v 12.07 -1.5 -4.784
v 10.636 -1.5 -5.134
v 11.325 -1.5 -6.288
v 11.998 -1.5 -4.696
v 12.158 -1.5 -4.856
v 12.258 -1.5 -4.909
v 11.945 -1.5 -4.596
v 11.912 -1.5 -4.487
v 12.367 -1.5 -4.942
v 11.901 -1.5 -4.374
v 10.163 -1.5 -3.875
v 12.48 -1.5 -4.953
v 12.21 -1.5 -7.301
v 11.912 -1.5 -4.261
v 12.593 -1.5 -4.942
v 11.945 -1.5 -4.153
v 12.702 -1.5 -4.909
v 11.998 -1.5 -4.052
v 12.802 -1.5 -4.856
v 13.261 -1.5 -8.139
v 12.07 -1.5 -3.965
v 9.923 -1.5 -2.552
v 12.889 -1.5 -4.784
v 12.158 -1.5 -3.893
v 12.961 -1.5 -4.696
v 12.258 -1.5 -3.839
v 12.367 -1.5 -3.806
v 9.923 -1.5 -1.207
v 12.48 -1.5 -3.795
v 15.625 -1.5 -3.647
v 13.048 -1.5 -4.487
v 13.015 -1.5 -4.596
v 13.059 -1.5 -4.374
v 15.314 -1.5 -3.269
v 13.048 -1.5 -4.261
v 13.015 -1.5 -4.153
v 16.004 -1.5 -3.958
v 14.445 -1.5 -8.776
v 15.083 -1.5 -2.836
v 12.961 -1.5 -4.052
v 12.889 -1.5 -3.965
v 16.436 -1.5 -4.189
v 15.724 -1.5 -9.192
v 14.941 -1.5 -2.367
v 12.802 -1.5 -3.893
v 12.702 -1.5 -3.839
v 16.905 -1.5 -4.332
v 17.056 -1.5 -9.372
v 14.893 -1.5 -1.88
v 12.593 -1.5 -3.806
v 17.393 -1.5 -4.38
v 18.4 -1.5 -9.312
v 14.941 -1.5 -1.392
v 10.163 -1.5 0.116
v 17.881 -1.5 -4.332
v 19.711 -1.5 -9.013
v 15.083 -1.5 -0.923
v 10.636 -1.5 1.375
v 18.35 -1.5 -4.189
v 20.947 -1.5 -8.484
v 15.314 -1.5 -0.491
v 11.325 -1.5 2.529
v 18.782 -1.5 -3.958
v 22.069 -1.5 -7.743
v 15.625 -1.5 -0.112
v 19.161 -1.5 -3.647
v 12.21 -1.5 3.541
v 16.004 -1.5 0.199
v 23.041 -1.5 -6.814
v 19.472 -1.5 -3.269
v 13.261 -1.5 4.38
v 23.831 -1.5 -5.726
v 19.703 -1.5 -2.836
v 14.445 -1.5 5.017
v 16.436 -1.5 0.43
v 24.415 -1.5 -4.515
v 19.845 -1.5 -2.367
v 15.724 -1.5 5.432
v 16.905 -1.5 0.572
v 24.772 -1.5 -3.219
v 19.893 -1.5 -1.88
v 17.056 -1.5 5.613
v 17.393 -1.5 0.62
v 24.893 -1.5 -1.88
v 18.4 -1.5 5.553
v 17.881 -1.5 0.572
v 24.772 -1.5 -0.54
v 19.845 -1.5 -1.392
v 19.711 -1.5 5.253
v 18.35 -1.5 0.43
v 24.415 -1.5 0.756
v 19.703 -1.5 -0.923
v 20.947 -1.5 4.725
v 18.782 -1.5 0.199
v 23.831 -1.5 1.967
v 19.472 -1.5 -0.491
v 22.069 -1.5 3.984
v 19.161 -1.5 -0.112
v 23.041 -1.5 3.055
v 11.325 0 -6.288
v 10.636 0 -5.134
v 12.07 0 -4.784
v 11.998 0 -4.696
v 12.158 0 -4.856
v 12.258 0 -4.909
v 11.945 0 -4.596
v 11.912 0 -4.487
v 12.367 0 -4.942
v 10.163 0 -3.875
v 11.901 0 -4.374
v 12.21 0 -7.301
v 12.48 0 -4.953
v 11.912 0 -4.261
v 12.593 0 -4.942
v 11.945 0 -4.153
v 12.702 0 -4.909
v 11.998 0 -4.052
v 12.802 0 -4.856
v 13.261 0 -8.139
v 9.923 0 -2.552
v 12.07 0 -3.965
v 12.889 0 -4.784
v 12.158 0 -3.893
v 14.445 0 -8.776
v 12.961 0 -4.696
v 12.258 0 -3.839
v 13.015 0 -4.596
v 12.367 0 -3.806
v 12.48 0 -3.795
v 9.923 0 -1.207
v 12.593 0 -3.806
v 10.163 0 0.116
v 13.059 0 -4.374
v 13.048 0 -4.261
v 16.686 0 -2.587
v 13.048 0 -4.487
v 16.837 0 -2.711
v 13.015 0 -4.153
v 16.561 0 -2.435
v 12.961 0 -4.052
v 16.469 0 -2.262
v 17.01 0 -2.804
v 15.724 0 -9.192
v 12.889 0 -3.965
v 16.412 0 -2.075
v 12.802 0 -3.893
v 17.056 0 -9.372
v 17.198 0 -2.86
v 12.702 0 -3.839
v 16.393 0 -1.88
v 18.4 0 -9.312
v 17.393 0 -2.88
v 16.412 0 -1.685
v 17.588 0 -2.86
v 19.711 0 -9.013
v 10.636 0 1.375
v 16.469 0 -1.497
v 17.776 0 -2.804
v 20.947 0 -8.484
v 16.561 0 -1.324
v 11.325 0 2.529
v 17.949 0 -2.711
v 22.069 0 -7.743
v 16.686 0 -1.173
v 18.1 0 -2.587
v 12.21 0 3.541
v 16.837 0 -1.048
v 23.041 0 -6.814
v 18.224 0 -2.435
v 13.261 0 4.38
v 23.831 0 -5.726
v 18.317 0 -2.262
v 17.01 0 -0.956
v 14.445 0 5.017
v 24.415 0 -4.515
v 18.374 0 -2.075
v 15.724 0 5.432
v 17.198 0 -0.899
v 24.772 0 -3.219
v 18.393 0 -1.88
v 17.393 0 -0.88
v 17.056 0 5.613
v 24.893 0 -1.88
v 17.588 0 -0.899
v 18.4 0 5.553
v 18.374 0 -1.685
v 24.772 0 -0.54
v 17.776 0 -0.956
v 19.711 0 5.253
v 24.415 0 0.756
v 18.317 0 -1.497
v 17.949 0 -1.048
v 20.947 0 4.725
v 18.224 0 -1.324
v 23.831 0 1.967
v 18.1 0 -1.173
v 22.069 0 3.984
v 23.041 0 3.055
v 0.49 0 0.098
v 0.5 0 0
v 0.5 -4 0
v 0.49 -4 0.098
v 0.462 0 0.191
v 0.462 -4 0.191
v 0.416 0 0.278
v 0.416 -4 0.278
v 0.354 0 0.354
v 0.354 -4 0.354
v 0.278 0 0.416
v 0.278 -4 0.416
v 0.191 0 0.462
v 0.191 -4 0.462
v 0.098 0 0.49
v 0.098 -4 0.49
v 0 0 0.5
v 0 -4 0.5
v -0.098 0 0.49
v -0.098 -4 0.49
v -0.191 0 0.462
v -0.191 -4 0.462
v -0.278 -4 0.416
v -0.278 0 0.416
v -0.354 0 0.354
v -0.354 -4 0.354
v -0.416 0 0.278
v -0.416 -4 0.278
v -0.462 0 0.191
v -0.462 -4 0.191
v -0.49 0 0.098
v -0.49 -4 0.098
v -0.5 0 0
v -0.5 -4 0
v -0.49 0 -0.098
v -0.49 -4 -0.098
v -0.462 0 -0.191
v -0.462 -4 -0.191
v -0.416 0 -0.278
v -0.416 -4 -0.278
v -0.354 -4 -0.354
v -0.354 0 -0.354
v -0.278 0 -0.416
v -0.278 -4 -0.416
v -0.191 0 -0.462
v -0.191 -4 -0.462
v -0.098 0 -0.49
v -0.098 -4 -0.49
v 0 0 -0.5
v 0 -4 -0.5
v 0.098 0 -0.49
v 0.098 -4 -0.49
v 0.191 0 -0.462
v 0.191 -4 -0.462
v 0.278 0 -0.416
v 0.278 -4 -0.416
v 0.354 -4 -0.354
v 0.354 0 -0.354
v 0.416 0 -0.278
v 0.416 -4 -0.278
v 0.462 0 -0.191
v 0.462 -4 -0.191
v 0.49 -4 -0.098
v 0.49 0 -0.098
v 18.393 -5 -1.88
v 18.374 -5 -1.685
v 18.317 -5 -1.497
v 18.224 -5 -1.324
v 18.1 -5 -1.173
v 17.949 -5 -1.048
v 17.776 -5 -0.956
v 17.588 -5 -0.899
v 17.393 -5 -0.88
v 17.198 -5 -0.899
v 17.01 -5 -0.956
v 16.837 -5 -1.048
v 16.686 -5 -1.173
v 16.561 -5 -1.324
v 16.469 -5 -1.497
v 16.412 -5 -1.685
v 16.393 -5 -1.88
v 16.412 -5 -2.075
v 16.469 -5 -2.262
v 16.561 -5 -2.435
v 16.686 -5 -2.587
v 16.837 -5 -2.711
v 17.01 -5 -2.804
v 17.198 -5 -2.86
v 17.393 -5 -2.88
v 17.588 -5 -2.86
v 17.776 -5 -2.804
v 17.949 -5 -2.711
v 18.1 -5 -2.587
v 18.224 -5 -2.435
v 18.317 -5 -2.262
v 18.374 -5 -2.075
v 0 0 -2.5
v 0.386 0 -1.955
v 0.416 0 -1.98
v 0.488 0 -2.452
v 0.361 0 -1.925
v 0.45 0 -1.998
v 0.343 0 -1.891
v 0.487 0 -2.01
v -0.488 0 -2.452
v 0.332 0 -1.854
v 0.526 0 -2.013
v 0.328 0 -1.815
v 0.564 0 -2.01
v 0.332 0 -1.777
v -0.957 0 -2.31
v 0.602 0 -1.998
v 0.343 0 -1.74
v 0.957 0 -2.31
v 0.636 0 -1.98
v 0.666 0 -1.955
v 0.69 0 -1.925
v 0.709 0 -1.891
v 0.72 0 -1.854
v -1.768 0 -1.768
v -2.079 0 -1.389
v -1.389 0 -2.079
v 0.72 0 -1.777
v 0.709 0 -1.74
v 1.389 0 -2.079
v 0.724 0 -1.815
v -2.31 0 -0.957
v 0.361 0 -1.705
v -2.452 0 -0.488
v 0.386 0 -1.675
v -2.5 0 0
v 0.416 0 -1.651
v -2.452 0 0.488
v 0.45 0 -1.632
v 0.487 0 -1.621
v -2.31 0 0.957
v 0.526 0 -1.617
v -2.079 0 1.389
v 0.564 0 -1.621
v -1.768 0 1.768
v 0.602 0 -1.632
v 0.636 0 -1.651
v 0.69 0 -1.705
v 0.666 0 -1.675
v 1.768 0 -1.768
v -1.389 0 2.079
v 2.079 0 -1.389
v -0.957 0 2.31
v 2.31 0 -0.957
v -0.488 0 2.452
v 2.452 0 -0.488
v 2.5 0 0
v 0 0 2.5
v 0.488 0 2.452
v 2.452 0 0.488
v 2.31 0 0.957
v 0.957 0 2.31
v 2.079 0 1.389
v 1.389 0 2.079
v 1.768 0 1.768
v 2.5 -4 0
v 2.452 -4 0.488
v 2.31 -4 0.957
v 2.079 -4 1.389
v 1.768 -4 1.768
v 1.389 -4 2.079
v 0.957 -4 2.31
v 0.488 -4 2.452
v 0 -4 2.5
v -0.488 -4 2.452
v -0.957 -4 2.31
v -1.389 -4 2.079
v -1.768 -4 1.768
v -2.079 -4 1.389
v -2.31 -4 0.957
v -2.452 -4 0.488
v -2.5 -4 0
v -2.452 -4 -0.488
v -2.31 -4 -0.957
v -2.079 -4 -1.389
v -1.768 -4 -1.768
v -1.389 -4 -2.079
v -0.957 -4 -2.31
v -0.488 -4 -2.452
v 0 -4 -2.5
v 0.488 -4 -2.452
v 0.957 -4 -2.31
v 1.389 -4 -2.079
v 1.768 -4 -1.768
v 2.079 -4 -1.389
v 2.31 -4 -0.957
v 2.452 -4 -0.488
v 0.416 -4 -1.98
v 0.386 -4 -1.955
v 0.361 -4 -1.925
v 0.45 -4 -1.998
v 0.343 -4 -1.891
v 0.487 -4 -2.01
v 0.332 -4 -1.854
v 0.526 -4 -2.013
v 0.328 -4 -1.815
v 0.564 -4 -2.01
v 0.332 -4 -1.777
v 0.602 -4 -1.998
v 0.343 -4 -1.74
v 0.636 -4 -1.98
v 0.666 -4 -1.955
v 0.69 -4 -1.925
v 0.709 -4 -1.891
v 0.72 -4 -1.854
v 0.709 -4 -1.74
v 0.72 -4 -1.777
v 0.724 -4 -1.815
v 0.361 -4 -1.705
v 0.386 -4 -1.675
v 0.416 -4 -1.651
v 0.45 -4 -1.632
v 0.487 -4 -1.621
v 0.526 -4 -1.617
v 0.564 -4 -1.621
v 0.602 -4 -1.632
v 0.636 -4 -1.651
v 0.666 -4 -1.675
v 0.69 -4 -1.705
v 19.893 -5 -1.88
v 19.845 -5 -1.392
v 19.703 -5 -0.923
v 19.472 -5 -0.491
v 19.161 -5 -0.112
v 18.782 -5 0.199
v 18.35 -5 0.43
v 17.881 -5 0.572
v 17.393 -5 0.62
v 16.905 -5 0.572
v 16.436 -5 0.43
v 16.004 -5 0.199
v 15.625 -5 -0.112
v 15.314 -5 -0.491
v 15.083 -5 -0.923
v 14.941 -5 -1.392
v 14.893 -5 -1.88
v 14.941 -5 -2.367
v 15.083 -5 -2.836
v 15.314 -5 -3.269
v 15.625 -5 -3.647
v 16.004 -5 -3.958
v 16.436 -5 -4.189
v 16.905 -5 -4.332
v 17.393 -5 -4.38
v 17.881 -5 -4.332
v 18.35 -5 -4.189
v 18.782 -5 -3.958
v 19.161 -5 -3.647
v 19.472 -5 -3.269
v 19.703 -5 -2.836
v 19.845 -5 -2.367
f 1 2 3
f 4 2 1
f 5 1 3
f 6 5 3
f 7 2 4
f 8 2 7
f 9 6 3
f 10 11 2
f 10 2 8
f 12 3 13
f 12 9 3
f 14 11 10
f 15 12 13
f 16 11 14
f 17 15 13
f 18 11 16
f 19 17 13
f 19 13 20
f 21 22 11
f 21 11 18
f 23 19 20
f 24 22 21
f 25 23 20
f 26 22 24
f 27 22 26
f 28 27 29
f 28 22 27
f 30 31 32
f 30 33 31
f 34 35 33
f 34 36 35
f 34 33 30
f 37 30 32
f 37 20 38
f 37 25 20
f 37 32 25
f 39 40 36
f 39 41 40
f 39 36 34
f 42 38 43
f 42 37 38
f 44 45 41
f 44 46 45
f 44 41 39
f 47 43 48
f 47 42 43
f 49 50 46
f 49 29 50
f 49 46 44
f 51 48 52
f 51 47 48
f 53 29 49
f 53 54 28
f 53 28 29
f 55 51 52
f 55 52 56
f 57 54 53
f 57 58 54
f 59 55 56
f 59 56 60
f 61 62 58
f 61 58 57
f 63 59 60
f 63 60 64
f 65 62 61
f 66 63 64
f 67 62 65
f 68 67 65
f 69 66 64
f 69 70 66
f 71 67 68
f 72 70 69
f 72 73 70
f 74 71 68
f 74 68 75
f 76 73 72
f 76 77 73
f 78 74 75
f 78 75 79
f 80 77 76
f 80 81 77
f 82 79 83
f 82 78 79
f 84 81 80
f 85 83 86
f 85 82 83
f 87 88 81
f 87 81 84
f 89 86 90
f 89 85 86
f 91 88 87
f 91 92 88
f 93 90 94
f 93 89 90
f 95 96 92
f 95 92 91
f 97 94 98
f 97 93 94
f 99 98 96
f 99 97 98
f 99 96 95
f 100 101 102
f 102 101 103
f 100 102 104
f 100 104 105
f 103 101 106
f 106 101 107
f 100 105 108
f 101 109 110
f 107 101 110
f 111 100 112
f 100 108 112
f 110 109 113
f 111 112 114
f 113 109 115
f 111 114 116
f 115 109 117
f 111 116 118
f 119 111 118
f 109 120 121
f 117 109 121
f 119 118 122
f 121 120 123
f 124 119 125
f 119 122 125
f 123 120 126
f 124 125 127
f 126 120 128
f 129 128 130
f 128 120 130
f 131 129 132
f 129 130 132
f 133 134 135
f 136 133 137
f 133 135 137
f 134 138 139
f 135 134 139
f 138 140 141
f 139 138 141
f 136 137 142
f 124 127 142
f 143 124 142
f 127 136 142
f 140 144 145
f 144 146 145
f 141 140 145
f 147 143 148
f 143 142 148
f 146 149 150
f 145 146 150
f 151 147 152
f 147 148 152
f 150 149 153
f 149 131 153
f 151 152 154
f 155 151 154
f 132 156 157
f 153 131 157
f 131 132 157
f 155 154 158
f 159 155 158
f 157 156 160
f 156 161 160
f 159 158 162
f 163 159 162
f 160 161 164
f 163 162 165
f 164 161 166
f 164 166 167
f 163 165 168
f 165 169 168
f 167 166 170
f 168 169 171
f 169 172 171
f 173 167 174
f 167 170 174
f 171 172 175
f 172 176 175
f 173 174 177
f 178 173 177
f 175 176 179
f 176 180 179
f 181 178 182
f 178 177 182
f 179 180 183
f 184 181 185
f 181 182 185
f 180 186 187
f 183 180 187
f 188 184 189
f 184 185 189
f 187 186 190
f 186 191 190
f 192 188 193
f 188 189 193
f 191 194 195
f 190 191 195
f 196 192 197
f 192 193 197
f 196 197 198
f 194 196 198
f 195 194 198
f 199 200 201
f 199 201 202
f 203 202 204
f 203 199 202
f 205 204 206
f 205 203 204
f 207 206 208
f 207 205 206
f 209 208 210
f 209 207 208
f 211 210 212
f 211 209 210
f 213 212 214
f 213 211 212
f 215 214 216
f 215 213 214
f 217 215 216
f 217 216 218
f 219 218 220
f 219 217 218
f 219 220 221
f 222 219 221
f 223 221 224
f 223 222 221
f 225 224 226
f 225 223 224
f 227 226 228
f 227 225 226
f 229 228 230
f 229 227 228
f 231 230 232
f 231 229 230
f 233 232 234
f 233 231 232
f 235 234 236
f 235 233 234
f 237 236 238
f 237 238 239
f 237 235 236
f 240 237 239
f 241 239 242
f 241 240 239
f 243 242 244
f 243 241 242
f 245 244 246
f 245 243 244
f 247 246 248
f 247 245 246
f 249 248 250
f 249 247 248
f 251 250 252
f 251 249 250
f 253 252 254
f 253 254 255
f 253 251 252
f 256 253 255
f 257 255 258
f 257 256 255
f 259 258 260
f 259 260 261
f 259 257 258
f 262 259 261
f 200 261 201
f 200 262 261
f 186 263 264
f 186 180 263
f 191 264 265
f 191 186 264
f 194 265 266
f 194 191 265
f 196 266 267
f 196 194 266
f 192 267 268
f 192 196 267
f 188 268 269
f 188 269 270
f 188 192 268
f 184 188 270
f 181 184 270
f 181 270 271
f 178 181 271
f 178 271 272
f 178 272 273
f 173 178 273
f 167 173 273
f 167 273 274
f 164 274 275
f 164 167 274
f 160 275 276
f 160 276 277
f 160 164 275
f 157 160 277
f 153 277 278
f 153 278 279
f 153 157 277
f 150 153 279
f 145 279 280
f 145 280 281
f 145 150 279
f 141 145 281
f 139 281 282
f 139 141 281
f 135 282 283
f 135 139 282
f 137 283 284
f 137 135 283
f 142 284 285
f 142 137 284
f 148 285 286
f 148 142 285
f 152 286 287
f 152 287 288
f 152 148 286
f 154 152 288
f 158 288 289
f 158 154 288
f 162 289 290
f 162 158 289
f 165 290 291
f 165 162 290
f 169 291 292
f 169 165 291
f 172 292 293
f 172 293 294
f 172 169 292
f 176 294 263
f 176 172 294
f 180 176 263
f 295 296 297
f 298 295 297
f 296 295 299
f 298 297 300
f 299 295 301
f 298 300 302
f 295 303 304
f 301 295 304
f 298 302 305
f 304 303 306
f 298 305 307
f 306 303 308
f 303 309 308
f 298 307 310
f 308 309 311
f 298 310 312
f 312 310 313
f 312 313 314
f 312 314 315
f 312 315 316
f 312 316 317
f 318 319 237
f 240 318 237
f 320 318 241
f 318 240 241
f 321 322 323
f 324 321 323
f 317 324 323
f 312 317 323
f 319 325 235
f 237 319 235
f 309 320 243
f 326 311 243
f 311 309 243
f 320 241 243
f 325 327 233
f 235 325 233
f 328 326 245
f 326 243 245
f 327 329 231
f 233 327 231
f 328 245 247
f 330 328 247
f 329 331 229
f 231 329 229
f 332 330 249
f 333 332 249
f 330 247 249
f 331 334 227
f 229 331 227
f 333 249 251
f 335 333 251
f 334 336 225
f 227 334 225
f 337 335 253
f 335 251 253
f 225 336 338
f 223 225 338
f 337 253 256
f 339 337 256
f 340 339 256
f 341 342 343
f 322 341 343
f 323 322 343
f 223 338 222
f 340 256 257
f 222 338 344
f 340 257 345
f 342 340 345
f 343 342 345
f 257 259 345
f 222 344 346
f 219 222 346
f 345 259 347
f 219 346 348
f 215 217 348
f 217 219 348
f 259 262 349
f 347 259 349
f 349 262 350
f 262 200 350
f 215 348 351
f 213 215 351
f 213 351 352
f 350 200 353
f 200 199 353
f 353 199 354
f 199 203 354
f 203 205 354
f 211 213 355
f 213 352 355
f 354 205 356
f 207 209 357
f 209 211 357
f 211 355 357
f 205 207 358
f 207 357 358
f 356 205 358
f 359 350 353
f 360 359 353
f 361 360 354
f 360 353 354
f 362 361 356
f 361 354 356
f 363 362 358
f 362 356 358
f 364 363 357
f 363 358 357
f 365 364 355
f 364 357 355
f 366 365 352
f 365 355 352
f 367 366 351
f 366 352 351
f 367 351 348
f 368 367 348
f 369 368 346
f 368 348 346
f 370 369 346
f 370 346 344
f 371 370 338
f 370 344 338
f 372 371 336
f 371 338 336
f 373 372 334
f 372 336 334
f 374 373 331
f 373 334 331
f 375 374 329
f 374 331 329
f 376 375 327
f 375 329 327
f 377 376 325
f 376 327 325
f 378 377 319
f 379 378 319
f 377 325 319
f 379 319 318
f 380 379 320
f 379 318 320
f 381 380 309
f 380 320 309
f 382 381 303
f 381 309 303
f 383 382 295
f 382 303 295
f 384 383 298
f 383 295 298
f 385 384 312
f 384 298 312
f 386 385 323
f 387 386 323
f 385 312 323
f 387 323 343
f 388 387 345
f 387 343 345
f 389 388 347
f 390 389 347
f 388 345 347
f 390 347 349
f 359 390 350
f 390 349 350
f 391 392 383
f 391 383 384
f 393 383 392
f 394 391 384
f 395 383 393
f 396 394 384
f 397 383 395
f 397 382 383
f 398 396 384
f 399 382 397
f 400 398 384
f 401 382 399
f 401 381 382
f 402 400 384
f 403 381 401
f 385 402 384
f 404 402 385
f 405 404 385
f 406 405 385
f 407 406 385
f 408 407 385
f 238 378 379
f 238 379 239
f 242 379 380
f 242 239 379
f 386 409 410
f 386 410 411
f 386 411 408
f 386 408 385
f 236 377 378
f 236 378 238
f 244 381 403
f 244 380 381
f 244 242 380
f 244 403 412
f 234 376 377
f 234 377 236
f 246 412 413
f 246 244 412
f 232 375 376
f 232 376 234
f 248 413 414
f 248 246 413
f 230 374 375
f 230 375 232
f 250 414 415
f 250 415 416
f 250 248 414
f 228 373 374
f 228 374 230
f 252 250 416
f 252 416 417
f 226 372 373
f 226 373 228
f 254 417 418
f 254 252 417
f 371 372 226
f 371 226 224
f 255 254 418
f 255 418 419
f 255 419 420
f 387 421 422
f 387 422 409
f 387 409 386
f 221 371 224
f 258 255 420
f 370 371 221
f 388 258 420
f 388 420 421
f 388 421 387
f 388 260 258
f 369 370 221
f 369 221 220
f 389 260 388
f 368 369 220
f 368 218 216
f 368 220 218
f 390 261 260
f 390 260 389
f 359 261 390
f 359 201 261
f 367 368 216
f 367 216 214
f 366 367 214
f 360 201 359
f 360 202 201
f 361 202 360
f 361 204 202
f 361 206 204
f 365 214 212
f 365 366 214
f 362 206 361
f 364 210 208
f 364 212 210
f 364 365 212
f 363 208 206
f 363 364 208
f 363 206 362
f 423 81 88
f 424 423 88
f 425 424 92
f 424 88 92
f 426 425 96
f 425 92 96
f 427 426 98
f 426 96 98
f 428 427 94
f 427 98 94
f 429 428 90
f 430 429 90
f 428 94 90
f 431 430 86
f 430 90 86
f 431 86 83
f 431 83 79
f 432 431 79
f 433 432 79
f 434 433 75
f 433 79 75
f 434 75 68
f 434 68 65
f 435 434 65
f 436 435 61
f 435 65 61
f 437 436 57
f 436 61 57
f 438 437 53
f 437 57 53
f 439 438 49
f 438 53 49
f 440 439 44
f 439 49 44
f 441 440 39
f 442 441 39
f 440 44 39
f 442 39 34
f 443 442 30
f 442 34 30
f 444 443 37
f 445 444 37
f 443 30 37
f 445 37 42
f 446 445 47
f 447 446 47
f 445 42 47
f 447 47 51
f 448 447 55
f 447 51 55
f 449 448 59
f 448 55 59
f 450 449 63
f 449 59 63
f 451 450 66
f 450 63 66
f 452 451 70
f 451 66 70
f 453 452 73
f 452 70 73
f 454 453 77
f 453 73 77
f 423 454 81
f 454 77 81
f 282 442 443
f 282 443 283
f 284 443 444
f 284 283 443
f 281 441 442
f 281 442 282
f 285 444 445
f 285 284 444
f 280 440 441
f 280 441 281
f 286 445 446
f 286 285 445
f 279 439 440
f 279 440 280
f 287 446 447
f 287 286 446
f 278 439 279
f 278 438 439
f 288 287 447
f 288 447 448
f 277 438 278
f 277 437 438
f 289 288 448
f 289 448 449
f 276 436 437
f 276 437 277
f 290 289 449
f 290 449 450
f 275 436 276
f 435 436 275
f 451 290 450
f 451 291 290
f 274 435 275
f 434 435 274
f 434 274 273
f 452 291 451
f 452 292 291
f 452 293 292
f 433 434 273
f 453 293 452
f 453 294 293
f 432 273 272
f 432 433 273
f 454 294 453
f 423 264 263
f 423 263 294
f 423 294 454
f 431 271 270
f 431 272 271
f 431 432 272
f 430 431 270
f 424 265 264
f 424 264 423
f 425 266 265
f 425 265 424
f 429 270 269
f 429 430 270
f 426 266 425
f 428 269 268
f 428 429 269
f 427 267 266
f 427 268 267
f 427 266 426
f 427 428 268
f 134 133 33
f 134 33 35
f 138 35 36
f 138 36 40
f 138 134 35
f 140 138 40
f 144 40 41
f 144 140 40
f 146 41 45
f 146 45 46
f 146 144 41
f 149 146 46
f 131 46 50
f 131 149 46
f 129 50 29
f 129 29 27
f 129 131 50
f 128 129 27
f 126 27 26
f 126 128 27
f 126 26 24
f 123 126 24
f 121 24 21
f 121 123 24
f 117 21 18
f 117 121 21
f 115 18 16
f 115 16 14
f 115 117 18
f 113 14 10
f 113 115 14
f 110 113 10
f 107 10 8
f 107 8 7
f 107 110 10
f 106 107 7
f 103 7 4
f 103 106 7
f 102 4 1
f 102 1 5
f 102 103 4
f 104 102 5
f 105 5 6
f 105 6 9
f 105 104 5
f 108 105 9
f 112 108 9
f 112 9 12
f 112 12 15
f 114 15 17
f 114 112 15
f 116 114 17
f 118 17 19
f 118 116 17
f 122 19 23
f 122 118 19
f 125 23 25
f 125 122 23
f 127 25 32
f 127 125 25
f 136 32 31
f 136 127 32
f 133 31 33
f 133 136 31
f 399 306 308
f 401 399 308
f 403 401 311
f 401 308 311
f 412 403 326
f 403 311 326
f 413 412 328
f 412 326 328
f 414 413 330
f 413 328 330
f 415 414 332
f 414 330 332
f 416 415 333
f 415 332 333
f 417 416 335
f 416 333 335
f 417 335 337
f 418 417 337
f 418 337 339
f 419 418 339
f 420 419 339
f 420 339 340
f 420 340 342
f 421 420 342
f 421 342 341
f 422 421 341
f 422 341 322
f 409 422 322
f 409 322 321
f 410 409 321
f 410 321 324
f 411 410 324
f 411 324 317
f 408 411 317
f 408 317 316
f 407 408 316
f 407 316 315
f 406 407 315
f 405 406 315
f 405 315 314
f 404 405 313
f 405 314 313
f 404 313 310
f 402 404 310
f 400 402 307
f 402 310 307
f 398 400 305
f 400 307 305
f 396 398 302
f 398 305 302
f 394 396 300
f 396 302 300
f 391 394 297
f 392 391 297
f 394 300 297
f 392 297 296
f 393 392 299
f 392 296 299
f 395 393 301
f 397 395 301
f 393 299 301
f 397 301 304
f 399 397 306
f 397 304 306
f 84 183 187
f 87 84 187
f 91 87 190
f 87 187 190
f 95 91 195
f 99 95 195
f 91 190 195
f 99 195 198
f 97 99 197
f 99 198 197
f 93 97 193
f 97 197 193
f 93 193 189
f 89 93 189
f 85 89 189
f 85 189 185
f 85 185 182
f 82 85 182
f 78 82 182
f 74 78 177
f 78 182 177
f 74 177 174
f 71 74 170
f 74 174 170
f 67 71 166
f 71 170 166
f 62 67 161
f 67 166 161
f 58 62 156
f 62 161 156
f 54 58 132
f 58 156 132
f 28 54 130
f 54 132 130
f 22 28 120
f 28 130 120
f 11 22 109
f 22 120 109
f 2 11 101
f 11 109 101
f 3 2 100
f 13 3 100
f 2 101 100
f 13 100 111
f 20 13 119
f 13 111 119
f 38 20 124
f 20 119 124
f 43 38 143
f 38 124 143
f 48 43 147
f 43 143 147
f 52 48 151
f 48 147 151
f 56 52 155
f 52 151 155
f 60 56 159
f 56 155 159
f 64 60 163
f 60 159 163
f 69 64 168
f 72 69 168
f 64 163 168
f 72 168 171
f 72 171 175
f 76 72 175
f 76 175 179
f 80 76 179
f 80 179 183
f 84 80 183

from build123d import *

# Parameters (mm, degrees)
F0_R     = 2.5
F0_R_2   = 0.5
F1_DEPTH = 4
F2_R     = 7.5
F2_R_2   = 0.579106
F2_R_3   = 1
F3_DEPTH = 1.5
F4_R     = 2.5
F4_R_2   = 1
F5_DEPTH = 3.5
F6_R     = 0.19797
F7_DEPTH = 5.001


with BuildPart() as f1:
    # F0 (on Front) → F1 (new body)
    with BuildSketch(Plane.XZ):
        Circle(F0_R)
        Circle(F0_R_2, mode=Mode.SUBTRACT)
    extrude(amount=F1_DEPTH)

    # F6 (on face) → F7 (cut, through all)
    with BuildSketch(Plane(origin=(0, 0, 0), x_dir=(-1, 0, 0), z_dir=(0, 1, 0))):
        with Locations((-0.525748, -1.815386)):
            Circle(F6_R)
    extrude(amount=-F7_DEPTH, mode=Mode.SUBTRACT)


with BuildPart() as f3:
    # F2 (on Front) → F3 (new body)
    with BuildSketch(Plane.XZ):
        with Locations((17.39296, -1.879622)):
            Circle(F2_R)
        with Locations((12.479952, -4.374151)):
            Circle(F2_R_2, mode=Mode.SUBTRACT)
        with Locations((17.39296, -1.879622)):
            Circle(F2_R_3, mode=Mode.SUBTRACT)
    extrude(amount=F3_DEPTH)

    # F4 (on face) → F5 (join)
    with BuildSketch(Plane.XZ.offset(1.5)):
        with Locations((17.39296, -1.879622)):
            Circle(F4_R)
        with Locations((17.39296, -1.879622)):
            Circle(F4_R_2, mode=Mode.SUBTRACT)
    extrude(amount=F5_DEPTH)


solid = Compound([f1.part, f3.part])
